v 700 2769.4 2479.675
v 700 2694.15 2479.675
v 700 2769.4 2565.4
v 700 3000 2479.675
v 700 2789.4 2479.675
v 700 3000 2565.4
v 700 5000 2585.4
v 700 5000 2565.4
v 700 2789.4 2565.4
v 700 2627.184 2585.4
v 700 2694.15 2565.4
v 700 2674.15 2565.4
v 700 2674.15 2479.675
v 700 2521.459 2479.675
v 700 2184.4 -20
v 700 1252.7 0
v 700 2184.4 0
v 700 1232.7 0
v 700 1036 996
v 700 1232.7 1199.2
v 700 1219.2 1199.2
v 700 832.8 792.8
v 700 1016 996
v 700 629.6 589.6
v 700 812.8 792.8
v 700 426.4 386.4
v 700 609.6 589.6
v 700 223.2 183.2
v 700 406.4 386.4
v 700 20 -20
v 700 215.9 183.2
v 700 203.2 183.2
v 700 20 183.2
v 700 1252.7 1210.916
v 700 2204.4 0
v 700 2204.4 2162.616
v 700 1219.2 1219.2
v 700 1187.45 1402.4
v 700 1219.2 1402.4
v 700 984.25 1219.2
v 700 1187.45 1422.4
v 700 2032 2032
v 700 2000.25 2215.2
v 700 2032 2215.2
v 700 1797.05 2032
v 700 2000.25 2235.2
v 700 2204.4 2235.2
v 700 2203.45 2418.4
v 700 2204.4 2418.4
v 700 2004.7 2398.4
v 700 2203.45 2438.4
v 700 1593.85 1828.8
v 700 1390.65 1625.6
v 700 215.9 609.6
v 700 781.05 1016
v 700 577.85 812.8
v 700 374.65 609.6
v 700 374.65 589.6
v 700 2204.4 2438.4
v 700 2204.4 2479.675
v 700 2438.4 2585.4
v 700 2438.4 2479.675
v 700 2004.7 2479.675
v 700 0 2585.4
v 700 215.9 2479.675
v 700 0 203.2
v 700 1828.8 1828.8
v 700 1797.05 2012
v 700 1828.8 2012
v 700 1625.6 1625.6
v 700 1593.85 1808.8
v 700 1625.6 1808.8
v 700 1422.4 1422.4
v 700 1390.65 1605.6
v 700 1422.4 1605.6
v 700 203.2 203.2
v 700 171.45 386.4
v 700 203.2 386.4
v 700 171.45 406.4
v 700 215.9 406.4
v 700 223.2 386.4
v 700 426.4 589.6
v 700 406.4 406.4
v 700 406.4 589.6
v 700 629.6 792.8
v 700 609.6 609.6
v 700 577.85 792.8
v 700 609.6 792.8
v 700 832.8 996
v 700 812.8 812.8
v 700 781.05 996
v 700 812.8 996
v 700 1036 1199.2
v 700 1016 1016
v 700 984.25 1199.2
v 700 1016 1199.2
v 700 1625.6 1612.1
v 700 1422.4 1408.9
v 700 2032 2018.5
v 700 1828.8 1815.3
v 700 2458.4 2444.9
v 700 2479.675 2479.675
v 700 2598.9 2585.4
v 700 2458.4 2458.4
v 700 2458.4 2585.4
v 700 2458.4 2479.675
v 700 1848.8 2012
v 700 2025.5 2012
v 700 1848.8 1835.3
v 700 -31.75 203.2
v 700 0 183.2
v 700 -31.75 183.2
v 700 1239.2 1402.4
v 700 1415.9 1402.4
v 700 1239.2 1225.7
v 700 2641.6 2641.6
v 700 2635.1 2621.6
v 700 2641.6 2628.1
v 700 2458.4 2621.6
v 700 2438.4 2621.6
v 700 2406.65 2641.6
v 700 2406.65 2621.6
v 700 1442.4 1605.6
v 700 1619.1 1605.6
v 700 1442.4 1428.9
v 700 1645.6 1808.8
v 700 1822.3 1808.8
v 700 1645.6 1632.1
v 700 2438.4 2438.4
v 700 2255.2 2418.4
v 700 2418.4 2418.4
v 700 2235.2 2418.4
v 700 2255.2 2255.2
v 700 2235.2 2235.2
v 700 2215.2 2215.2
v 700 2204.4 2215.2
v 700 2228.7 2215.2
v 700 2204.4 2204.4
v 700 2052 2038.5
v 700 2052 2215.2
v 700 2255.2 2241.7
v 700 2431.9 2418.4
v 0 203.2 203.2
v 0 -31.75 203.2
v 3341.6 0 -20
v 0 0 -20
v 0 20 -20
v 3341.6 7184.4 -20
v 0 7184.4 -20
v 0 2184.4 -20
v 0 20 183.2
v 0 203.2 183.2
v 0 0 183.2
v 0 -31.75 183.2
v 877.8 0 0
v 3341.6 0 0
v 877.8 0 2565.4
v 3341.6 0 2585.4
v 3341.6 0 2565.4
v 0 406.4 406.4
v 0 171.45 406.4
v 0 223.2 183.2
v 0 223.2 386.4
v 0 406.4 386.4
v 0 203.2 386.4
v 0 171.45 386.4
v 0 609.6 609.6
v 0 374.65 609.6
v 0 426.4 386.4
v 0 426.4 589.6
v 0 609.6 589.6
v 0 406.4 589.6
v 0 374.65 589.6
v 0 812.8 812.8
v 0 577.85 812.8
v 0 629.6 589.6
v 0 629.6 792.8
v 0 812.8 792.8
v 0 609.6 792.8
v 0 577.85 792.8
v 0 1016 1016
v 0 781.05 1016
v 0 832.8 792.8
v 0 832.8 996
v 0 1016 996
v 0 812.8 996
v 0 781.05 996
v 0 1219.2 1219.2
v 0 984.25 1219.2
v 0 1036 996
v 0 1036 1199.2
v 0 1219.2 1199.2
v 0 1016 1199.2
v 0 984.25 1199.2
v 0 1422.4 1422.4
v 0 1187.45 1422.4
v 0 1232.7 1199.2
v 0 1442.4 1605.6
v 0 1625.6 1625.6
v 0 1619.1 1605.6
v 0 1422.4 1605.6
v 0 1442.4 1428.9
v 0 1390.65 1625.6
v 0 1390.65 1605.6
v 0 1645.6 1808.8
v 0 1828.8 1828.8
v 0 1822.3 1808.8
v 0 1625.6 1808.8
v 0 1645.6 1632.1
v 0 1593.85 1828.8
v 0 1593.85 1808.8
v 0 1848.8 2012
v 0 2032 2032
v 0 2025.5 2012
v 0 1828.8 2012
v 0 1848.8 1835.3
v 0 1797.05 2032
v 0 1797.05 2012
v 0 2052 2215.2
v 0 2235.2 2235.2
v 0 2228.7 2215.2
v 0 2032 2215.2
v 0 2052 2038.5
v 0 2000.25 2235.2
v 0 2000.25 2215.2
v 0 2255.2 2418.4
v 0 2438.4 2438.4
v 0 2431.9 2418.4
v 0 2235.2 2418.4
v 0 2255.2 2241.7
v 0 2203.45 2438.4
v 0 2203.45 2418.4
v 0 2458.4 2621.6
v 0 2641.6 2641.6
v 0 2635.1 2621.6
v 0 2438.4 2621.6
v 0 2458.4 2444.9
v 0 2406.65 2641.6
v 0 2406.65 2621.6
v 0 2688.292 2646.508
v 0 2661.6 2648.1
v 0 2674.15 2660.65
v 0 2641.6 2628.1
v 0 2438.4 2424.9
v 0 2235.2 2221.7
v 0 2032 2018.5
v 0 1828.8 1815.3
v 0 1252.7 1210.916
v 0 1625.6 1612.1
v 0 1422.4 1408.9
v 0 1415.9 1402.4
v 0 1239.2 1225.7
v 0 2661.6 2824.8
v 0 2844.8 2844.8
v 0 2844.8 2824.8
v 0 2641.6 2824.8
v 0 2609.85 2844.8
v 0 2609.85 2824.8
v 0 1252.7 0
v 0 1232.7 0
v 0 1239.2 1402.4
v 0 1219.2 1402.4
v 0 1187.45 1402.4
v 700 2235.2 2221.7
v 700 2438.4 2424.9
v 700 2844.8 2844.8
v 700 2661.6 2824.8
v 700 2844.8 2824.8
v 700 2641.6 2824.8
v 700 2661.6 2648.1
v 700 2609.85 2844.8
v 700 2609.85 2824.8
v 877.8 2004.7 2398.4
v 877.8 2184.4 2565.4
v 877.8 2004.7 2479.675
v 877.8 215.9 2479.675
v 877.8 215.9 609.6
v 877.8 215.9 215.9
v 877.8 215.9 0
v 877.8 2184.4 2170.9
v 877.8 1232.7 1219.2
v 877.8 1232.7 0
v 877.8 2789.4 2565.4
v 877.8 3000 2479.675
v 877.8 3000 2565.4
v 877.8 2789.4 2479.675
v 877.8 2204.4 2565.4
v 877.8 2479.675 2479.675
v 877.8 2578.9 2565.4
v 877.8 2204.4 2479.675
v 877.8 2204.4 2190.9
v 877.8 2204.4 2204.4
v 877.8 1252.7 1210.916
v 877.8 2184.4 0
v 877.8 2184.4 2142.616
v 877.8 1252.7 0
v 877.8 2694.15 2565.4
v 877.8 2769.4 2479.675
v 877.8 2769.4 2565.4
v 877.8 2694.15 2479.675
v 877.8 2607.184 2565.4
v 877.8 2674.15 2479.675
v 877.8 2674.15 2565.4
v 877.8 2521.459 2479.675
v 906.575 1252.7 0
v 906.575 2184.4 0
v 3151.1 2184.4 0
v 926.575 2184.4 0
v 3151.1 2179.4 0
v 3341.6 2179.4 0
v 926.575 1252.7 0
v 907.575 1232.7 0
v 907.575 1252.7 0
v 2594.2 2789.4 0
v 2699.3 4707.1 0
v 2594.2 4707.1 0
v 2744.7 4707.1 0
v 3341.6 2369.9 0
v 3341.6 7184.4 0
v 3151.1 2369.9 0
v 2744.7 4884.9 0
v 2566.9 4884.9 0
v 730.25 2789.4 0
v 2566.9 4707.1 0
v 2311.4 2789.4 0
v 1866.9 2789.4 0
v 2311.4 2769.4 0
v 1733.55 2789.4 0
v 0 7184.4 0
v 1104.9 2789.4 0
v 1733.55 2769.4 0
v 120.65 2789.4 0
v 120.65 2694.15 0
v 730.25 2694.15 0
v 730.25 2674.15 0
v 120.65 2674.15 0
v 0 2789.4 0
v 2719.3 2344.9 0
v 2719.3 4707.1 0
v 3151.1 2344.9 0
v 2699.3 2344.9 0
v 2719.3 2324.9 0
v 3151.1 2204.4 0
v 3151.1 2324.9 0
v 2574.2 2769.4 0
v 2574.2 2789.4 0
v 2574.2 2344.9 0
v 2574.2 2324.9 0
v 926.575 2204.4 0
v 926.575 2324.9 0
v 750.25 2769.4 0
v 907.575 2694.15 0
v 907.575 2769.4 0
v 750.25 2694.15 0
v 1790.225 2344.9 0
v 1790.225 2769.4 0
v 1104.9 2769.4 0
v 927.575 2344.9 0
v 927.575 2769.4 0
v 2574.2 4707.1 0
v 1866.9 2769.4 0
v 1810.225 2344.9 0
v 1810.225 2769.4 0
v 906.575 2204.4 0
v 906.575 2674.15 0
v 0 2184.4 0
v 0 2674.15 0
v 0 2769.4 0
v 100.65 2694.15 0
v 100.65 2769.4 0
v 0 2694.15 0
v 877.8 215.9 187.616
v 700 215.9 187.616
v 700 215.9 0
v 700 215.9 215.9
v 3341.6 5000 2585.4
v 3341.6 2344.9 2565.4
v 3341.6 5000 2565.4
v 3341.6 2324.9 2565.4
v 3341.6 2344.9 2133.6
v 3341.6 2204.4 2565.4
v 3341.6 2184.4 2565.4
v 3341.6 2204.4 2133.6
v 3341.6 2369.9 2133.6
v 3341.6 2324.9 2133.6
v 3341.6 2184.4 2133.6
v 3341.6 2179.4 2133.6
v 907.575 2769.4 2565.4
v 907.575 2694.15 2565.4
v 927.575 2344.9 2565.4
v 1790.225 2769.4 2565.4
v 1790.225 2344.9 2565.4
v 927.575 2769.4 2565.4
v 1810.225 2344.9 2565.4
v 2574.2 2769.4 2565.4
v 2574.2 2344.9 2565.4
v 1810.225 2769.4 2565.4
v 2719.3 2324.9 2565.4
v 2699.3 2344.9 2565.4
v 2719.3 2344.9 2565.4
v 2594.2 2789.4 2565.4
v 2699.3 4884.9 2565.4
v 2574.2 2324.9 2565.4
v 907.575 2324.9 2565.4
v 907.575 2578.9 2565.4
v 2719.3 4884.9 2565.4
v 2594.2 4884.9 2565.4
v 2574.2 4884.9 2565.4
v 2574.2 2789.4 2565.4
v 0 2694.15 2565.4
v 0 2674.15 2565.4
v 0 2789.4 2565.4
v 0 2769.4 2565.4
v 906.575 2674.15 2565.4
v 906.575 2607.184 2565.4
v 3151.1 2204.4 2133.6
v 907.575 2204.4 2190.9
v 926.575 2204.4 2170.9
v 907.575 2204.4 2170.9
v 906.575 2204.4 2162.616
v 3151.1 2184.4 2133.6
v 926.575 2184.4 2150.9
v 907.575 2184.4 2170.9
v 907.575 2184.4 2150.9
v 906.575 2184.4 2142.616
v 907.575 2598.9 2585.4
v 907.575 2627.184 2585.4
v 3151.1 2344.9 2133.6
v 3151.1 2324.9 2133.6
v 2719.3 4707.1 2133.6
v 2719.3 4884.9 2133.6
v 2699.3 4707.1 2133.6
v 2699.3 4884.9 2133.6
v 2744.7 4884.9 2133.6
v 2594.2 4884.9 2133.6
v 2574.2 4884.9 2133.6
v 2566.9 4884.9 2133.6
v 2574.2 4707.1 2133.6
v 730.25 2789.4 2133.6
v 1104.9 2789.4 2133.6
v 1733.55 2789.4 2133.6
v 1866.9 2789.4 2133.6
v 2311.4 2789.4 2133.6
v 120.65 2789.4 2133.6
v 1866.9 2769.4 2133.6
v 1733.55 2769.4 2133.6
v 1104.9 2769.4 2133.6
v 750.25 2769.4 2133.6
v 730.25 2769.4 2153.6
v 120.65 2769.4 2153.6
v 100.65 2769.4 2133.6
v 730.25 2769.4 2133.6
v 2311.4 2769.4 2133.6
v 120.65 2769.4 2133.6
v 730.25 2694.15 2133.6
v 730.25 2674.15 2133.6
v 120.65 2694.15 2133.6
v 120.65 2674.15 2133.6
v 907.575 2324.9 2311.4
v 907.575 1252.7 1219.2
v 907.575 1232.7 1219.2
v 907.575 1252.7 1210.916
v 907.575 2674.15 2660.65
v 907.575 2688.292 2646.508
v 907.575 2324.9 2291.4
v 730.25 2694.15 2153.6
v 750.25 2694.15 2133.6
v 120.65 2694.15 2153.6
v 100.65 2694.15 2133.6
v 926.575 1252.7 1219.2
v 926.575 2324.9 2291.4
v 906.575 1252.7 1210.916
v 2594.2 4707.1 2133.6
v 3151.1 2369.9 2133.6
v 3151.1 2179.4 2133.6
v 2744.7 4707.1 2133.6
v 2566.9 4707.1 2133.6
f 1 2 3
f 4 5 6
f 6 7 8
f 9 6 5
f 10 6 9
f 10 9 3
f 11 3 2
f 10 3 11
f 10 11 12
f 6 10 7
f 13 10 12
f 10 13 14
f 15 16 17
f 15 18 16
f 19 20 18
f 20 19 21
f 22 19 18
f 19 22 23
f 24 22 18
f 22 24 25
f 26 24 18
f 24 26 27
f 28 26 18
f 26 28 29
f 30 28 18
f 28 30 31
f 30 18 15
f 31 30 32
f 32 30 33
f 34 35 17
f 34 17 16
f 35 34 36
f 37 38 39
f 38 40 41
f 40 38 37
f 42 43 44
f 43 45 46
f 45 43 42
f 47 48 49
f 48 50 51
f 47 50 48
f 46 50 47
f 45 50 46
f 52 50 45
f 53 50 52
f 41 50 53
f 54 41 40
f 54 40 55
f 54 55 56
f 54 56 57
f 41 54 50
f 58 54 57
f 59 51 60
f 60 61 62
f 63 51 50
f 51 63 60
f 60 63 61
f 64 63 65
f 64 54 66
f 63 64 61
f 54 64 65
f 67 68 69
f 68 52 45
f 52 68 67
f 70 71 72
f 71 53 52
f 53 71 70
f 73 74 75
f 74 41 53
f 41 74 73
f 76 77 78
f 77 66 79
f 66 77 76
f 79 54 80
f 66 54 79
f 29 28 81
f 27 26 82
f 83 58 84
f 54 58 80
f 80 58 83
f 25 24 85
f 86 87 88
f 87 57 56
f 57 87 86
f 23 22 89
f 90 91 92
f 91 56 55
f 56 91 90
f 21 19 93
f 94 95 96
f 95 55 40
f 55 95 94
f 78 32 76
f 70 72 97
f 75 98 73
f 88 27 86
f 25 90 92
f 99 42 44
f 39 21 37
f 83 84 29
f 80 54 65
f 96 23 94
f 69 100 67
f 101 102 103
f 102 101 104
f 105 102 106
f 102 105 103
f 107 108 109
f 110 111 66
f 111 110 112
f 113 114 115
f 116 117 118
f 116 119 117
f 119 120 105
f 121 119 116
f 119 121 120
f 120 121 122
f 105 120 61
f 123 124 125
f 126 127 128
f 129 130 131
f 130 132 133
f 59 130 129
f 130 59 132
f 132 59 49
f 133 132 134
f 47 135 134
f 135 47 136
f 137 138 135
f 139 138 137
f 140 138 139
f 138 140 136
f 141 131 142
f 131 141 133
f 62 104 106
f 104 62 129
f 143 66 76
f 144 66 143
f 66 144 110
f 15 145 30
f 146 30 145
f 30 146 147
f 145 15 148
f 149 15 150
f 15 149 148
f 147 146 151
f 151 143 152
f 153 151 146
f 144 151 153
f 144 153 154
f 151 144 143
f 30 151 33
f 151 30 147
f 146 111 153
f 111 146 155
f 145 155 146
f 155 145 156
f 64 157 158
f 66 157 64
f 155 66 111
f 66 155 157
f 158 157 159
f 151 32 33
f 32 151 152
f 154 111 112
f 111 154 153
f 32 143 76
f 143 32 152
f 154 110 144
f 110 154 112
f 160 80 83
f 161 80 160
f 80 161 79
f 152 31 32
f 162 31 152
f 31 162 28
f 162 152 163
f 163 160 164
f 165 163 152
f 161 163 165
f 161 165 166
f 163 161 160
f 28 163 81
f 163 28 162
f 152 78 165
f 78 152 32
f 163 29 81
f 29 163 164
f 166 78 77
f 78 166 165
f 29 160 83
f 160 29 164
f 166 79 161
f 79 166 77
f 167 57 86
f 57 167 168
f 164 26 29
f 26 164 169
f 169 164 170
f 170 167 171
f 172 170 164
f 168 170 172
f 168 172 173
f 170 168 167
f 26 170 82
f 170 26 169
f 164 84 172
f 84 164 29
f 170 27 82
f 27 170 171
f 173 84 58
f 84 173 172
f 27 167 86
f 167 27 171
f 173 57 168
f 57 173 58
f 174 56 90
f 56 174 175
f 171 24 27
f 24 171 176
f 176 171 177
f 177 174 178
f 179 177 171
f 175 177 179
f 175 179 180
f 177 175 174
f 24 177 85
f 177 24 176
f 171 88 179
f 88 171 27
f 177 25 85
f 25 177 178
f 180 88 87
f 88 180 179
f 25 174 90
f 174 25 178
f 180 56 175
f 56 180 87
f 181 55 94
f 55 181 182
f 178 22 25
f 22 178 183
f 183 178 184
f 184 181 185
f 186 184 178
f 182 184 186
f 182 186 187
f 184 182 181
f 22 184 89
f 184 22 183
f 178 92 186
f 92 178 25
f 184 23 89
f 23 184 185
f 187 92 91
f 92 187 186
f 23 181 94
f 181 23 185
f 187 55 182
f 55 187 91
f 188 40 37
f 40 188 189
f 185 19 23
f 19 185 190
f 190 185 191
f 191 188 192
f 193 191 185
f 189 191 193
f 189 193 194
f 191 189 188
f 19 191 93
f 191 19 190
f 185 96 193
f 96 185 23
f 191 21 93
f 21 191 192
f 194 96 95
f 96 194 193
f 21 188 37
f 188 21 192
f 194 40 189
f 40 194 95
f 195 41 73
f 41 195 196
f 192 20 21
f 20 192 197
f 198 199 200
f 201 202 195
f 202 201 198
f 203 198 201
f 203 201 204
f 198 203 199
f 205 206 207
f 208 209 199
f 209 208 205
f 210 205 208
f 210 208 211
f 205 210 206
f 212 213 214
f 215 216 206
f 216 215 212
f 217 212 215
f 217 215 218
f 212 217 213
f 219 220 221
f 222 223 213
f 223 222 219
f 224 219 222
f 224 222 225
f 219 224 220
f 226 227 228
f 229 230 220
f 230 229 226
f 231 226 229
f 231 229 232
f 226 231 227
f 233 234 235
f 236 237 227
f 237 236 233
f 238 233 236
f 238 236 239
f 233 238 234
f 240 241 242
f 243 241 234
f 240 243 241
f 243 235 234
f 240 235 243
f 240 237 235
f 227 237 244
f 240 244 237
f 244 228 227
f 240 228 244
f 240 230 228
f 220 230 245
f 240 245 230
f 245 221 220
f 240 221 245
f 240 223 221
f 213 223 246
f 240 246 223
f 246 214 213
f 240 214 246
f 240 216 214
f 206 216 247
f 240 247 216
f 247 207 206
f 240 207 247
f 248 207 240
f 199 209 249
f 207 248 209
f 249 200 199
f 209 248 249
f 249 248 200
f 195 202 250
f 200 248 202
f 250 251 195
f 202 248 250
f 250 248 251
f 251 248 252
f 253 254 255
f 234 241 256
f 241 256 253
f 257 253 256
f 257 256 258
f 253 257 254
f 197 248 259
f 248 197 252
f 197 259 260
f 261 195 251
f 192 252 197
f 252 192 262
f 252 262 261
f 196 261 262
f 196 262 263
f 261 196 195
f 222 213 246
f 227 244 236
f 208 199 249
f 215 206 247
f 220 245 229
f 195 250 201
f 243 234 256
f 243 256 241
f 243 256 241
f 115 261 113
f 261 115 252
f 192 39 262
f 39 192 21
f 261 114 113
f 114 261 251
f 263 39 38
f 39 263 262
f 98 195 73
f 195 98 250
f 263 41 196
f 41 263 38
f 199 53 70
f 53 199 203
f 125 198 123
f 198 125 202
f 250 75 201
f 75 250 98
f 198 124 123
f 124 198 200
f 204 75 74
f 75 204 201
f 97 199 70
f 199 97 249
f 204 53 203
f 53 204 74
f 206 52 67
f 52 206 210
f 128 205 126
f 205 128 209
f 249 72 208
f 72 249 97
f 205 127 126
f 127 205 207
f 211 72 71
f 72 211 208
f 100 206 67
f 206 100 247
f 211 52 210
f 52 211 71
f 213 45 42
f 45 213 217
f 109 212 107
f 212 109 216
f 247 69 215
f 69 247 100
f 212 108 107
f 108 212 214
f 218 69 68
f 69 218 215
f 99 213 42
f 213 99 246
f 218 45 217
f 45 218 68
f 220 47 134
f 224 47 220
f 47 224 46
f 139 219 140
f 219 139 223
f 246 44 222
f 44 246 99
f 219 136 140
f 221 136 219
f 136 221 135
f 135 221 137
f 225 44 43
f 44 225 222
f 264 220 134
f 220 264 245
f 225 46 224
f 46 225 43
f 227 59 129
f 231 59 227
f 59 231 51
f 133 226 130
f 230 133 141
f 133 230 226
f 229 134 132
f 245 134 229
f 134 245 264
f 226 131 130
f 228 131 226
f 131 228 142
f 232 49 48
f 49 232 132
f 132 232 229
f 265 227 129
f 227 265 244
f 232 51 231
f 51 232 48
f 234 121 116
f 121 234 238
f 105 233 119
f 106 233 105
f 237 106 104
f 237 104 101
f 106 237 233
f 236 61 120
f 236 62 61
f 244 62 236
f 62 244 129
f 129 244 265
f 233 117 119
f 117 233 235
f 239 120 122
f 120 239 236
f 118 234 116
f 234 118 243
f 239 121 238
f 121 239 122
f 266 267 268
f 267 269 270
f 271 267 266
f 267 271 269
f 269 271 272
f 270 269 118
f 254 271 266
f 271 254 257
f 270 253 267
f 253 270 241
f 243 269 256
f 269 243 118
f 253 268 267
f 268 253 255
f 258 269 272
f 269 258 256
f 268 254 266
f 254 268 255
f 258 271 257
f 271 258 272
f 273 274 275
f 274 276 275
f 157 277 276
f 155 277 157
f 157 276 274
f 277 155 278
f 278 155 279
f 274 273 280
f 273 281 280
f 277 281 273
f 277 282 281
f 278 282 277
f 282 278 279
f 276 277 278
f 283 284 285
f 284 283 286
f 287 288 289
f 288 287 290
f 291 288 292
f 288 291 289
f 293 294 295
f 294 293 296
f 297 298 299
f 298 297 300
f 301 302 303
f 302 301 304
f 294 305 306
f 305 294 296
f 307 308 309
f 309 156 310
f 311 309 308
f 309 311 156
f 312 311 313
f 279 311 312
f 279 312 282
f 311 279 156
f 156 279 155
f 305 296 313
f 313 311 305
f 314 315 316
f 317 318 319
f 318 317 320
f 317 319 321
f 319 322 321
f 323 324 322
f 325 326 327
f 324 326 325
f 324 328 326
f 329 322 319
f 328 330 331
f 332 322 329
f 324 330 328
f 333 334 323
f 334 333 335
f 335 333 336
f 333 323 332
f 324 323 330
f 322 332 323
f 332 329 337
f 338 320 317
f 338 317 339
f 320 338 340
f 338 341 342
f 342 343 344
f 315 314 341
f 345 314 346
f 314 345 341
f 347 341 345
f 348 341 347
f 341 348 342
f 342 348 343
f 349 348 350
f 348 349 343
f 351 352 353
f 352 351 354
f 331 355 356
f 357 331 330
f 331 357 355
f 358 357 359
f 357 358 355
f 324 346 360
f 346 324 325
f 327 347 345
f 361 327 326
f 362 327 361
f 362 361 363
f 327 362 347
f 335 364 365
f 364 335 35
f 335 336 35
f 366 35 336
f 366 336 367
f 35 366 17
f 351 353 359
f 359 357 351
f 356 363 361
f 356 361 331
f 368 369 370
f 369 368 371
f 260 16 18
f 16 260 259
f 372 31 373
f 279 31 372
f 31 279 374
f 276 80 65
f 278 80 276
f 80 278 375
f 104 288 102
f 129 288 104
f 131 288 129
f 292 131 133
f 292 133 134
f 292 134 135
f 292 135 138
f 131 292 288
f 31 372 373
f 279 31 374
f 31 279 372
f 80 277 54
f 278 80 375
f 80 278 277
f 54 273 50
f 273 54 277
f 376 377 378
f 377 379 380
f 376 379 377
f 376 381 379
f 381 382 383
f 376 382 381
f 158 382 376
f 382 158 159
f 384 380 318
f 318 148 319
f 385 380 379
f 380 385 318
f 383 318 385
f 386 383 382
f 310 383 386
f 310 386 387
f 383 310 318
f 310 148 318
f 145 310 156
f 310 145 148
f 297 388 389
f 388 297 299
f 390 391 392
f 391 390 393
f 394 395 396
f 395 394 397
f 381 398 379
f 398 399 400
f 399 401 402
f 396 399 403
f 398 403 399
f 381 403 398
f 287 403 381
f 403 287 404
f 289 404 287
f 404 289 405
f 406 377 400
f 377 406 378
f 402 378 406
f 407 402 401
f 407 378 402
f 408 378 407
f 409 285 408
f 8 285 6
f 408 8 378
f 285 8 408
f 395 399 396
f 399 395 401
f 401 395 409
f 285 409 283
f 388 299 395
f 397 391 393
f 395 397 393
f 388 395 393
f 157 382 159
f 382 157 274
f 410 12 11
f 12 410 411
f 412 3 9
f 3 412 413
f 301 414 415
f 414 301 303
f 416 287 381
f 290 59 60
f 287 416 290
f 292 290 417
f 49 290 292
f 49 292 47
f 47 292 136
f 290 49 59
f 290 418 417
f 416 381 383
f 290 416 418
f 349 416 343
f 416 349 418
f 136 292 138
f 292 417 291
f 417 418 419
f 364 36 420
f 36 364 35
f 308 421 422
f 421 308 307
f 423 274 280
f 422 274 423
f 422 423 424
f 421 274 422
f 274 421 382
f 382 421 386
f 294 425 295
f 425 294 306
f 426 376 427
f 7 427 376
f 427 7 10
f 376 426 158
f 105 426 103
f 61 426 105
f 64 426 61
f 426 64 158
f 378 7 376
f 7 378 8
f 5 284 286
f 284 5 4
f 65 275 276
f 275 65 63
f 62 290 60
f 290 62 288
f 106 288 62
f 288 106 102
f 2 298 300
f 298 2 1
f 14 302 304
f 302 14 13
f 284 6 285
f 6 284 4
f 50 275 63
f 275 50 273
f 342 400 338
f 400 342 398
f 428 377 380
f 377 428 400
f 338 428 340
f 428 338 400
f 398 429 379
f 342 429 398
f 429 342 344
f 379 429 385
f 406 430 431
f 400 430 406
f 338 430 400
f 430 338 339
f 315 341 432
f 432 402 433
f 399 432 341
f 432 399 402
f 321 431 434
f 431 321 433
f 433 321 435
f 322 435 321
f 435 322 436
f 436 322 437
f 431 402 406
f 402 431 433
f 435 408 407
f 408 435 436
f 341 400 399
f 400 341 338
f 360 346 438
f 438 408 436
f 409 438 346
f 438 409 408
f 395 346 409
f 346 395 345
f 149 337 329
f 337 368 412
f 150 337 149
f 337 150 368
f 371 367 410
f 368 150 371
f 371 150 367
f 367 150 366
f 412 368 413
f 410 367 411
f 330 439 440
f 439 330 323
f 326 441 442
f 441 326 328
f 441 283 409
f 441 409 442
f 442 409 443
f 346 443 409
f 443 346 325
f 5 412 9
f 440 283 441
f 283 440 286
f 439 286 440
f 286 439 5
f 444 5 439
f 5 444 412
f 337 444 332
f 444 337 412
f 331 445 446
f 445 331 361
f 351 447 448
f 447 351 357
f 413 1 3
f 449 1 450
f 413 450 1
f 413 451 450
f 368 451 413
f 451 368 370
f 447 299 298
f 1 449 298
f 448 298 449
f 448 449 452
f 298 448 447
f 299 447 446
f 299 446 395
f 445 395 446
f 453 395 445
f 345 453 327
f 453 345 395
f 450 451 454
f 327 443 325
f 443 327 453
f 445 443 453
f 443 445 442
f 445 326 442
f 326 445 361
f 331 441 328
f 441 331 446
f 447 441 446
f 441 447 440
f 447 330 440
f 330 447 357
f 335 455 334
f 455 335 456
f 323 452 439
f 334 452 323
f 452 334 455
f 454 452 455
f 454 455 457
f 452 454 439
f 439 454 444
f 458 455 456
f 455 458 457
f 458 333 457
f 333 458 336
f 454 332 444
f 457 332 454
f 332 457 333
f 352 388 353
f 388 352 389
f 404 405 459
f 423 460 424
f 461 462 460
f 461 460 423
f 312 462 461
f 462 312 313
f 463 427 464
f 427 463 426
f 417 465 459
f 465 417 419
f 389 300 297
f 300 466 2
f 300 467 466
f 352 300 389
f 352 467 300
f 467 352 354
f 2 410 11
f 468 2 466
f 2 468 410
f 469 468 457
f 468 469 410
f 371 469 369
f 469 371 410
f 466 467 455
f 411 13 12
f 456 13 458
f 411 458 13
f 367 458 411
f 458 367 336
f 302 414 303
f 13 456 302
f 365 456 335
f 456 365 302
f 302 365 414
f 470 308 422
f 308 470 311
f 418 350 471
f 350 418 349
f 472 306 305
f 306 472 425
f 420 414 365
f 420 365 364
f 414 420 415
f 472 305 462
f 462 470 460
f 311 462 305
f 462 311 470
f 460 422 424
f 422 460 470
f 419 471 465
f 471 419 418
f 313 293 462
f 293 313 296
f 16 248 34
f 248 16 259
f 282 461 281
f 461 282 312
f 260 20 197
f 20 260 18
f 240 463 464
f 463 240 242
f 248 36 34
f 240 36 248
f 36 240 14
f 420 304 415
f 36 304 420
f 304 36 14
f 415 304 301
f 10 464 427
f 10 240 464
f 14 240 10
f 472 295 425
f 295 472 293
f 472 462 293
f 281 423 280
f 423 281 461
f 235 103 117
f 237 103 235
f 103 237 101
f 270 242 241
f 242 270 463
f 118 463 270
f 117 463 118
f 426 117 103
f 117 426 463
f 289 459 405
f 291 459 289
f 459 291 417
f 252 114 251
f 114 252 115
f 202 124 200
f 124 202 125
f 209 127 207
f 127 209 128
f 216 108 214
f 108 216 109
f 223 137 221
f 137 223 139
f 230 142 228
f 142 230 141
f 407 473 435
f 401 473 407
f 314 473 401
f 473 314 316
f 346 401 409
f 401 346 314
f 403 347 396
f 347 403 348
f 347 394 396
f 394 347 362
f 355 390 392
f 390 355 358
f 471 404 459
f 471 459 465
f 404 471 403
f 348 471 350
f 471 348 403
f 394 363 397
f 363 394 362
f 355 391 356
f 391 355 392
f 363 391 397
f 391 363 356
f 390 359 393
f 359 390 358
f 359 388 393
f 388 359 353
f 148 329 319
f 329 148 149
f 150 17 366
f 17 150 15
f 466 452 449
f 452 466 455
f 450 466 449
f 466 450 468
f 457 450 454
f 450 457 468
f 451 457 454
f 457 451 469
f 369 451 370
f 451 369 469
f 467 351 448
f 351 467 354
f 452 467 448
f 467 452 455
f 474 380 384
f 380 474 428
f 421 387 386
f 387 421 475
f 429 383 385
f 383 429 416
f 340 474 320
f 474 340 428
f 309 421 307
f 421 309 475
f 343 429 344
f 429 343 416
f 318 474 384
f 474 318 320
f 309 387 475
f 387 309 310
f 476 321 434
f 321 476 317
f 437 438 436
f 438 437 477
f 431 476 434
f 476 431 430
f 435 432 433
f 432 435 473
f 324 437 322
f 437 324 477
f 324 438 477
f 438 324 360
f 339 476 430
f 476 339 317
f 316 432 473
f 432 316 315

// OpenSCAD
step_height_inches = 8;
step_overlap_inches = 1.25;
first_floor_height_inches = 101;
stairs_bannister_place_inches = 7;
stairs_bannister_place_height_at_start_inches = 24;
stairs_post_ns_inches = 8.5;
stairs_post_ew_inches = 7;
front_room_east_wall_length_to_post_inches = 77.5;
front_room_south_wall_to_edge_of_door_opening_inches = 104;

step_height_mm = step_height_inches * 25.4;
step_width_mm = 700;
step_depth_mm = 20;
stairs_post_ns_mm = stairs_post_ns_inches * 25.4;
stairs_post_ew_mm = stairs_post_ew_inches * 25.4;
stairs_bannister_place_height_at_start_mm = stairs_bannister_place_height_at_start_inches * 25.4;

step_overlap_mm = step_overlap_inches * 25.4;

wall_thickness_mm = 20;

first_floor_height_mm = first_floor_height_inches * 25.4;
front_room_east_wall_length_to_post_mm = front_room_east_wall_length_to_post_inches * 25.4;
front_room_south_wall_to_edge_of_door_opening_mm = front_room_south_wall_to_edge_of_door_opening_inches * 25.4;
front_room_door_lintel_thickness_mm = 5;

module step()
{
  translate([0, 0, -step_depth_mm])
  cube([step_width_mm, step_depth_mm, step_height_mm + step_depth_mm]);
  translate([0, -step_overlap_mm, step_height_mm - step_depth_mm])
  cube([step_width_mm, step_height_mm + step_overlap_mm, step_depth_mm]);
}

module steps()
{
  for (i = [1 : 14])
  {
    translate([0, step_height_mm * (i - 1), step_height_mm * (i - 1)])
    step();
  }

  translate([step_width_mm, 0, 0])
  cube([stairs_post_ew_mm, stairs_post_ns_mm, first_floor_height_mm]);

  translate([step_width_mm, 0, 0])
  rotate([-45, 0, 0])
  cube([stairs_post_ew_mm, wall_thickness_mm, first_floor_height_mm * sqrt(2)]);
}

front_room_ceiling_edge_height_inches = 3.375;
front_room_ceiling_corner_block_inches = 5.5;

front_room_ceiling_edge_height_mm = front_room_ceiling_edge_height_inches * 25.4;
front_room_ceiling_corner_block_mm = front_room_ceiling_corner_block_inches * 25.4;

module front_room()
{
  translate([step_width_mm, stairs_post_ns_mm, 0])
  difference()
  {
    cube([stairs_post_ew_mm, front_room_east_wall_length_to_post_mm, first_floor_height_mm]);
    
    translate([-wall_thickness_mm, 0, stairs_bannister_place_height_at_start_mm])
    rotate([45, 0, 0])
    cube([stairs_post_ew_mm + wall_thickness_mm * 2, front_room_east_wall_length_to_post_mm * 2, first_floor_height_mm]);
  }

  translate([step_width_mm, stairs_post_ns_mm + front_room_east_wall_length_to_post_mm, 0])
  cube([front_room_south_wall_to_edge_of_door_opening_mm, wall_thickness_mm, first_floor_height_mm]);
  
  translate([step_width_mm, 0, first_floor_height_mm])
  cube([front_room_south_wall_to_edge_of_door_opening_mm, 5000, wall_thickness_mm]);
  
  translate([step_width_mm, 0, -wall_thickness_mm])
  cube([front_room_south_wall_to_edge_of_door_opening_mm, 5000, wall_thickness_mm]);
  
  translate([step_width_mm, 0, first_floor_height_mm - front_room_ceiling_edge_height_mm])
  cube([stairs_post_ew_mm, 3000, front_room_ceiling_edge_height_mm]);
  
  translate([step_width_mm, stairs_post_ns_mm + front_room_east_wall_length_to_post_mm - front_room_ceiling_corner_block_mm - 40, first_floor_height_mm - front_room_ceiling_corner_block_mm * 2])
  cube([stairs_post_ew_mm, front_room_ceiling_corner_block_mm, front_room_ceiling_corner_block_mm * 2]);
}

front_room_door_frame_thickness_inches = 7.5;
door_frame_height_inches = 84; // estimate

front_room_door_frame_thickness_mm = front_room_door_frame_thickness_inches * 25.4;
door_frame_height_mm = door_frame_height_inches * 25.4;
door_frame_protrusion_into_front_room_mm = 5;
front_room_door_frame_protrusion_into_middle_room_mm = 25;

front_room_to_middle_room_wall_thickness_mm = front_room_door_frame_thickness_mm - door_frame_protrusion_into_front_room_mm - front_room_door_frame_protrusion_into_middle_room_mm;

middle_room_north_wall_inches = 24.5;
middle_room_east_wall_inches = 100;

middle_room_north_wall_mm = middle_room_north_wall_inches * 25.4;
middle_room_east_wall_mm = middle_room_east_wall_inches * 25.4;

module door_from_front_room_to_middle_room()
{
  translate(
    [
      step_width_mm + front_room_south_wall_to_edge_of_door_opening_mm - front_room_door_frame_thickness_mm,
      stairs_post_ns_mm + front_room_east_wall_length_to_post_mm - door_frame_protrusion_into_front_room_mm,
      0
    ])
  cube([front_room_door_frame_thickness_mm, front_room_door_frame_thickness_mm, door_frame_height_mm]);
}

module middle_room()
{
  translate(
    [
      step_width_mm + front_room_south_wall_to_edge_of_door_opening_mm - middle_room_north_wall_mm,
      stairs_post_ns_mm + front_room_east_wall_length_to_post_mm + front_room_door_frame_thickness_mm - door_frame_protrusion_into_front_room_mm - front_room_door_frame_protrusion_into_middle_room_mm - wall_thickness_mm,
      0
    ])
  cube([middle_room_north_wall_mm, wall_thickness_mm, first_floor_height_mm]);
  
  translate(
    [
      step_width_mm + front_room_south_wall_to_edge_of_door_opening_mm - middle_room_north_wall_mm - wall_thickness_mm,
      stairs_post_ns_mm + front_room_east_wall_length_to_post_mm + front_room_door_frame_thickness_mm - door_frame_protrusion_into_front_room_mm - front_room_door_frame_protrusion_into_middle_room_mm,
      0
    ])
  cube([wall_thickness_mm, middle_room_east_wall_mm, first_floor_height_mm]);
}

bedroom_door_frame_thickness_inches = 7;
bedroom_door_frame_protrusion_into_middle_room_inches = 1;
bedroom_door_frame_protrusion_into_bedroom_inches = 0.5;

bedroom_door_frame_thickness_mm = bedroom_door_frame_thickness_inches * 25.4;
bedroom_door_frame_protrusion_into_middle_room_mm = bedroom_door_frame_protrusion_into_middle_room_inches * 25.4;
bedroom_door_frame_protrusion_into_bedroom_mm = bedroom_door_frame_protrusion_into_bedroom_inches * 25.4;

module door_from_middle_room_to_bedroom()
{
  translate(
    [
      step_width_mm + front_room_south_wall_to_edge_of_door_opening_mm - middle_room_north_wall_mm - bedroom_door_frame_thickness_mm + bedroom_door_frame_protrusion_into_middle_room_mm,
      stairs_post_ns_mm + front_room_east_wall_length_to_post_mm + front_room_door_frame_thickness_mm - door_frame_protrusion_into_front_room_mm - front_room_door_frame_protrusion_into_middle_room_mm + middle_room_east_wall_mm - bedroom_door_frame_thickness_mm,
      0
    ])
  cube([bedroom_door_frame_thickness_mm, bedroom_door_frame_thickness_mm, door_frame_height_mm]);
}

bedroom_west_wall_inches = 82.5;
bedroom_closet_opening_offset_inches = 73.5;
bedroom_closet_opening_width_inches = 17.5;
bedroom_sink_opening_offset_inches = 43.5;
bedroom_sink_opening_width_inches = 24.75;
bedroom_toilet_opening_offset_inches = 4.75;
bedroom_toilet_opening_width_inches = 24;
bedroom_toilet_stall_back_wall_depth_inches = 56.75;
bedroom_toilet_stall_back_wall_height_inches = 48;
bedroom_toilet_stall_south_wall_depth_inches = 3.75;

bedroom_west_wall_mm = bedroom_west_wall_inches * 25.4;

bedroom_north_wall_mm = step_width_mm + front_room_south_wall_to_edge_of_door_opening_mm - middle_room_north_wall_mm - bedroom_door_frame_thickness_mm + wall_thickness_mm + bedroom_door_frame_protrusion_into_bedroom_mm;
bedroom_north_edge_offset_mm = stairs_post_ns_mm + front_room_east_wall_length_to_post_mm + front_room_door_frame_thickness_mm - door_frame_protrusion_into_front_room_mm - front_room_door_frame_protrusion_into_middle_room_mm + middle_room_east_wall_mm - bedroom_west_wall_mm;

bedroom_closet_opening_offset_mm = bedroom_closet_opening_offset_inches * 25.4;
bedroom_closet_opening_width_mm = bedroom_closet_opening_width_inches * 25.4;

bedroom_sink_opening_offset_mm = bedroom_sink_opening_offset_inches * 25.4;
bedroom_sink_opening_width_mm = bedroom_sink_opening_width_inches * 25.4;

bedroom_toilet_opening_offset_mm = bedroom_toilet_opening_offset_inches * 25.4;
bedroom_toilet_opening_width_mm = bedroom_toilet_opening_width_inches * 25.4;

bedroom_toilet_stall_back_wall_depth_mm = bedroom_toilet_stall_back_wall_depth_inches * 25.4;
bedroom_toilet_stall_back_wall_height_mm = bedroom_toilet_stall_back_wall_height_inches * 25.4;

bedroom_toilet_stall_width_mm = bedroom_sink_opening_offset_mm - 0.5 * (bedroom_sink_opening_offset_mm - (bedroom_toilet_opening_offset_mm + bedroom_toilet_opening_width_mm)) - 0.5 * wall_thickness_mm;

bedroom_toilet_stall_south_wall_depth_mm = bedroom_toilet_stall_south_wall_depth_inches * 25.4;

module bedroom_toilet_stall()
{
  translate([0, stairs_post_ns_mm + front_room_east_wall_length_to_post_mm + front_room_door_frame_thickness_mm - door_frame_protrusion_into_front_room_mm - front_room_door_frame_protrusion_into_middle_room_mm + middle_room_east_wall_mm - bedroom_west_wall_mm - bedroom_toilet_stall_back_wall_depth_mm - bedroom_toilet_stall_south_wall_depth_mm - wall_thickness_mm, 0])
  cube([bedroom_toilet_stall_width_mm, wall_thickness_mm, bedroom_toilet_stall_back_wall_height_mm]);

  translate([0, stairs_post_ns_mm + front_room_east_wall_length_to_post_mm + front_room_door_frame_thickness_mm - door_frame_protrusion_into_front_room_mm - front_room_door_frame_protrusion_into_middle_room_mm + middle_room_east_wall_mm - bedroom_west_wall_mm - bedroom_toilet_stall_back_wall_depth_mm - bedroom_toilet_stall_south_wall_depth_mm - wall_thickness_mm, bedroom_toilet_stall_back_wall_height_mm])
  rotate([-45, 0, 0])
  cube([bedroom_toilet_stall_width_mm, wall_thickness_mm, bedroom_toilet_stall_back_wall_depth_mm * sqrt(2)]);
  
  translate([bedroom_toilet_stall_width_mm - 1, stairs_post_ns_mm + front_room_east_wall_length_to_post_mm + front_room_door_frame_thickness_mm - door_frame_protrusion_into_front_room_mm - front_room_door_frame_protrusion_into_middle_room_mm + middle_room_east_wall_mm - bedroom_west_wall_mm - bedroom_toilet_stall_south_wall_depth_mm - bedroom_toilet_stall_back_wall_depth_mm, 0])
  difference()
  {
    cube([wall_thickness_mm, bedroom_toilet_stall_back_wall_depth_mm, first_floor_height_mm]);
    
    translate([-wall_thickness_mm, 0, bedroom_toilet_stall_back_wall_height_mm])
    rotate([-45, 0, 0])
    translate([0, -bedroom_toilet_stall_back_wall_depth_mm, 0])
    cube([wall_thickness_mm * 4, bedroom_toilet_stall_back_wall_depth_mm, first_floor_height_mm]);
  }
}

module bedroom()
{
  translate(
    [
      bedroom_north_wall_mm,
      stairs_post_ns_mm + front_room_east_wall_length_to_post_mm + front_room_door_frame_thickness_mm - door_frame_protrusion_into_front_room_mm - front_room_door_frame_protrusion_into_middle_room_mm + middle_room_east_wall_mm - bedroom_west_wall_mm,
      0
    ])
  cube([wall_thickness_mm, bedroom_west_wall_mm, first_floor_height_mm]);
  
  translate([0, bedroom_north_edge_offset_mm - wall_thickness_mm, 0])
  {
    difference()
    {
      cube([bedroom_north_wall_mm, wall_thickness_mm, first_floor_height_mm]);
  
      translate([bedroom_closet_opening_offset_mm, -wall_thickness_mm, -5])
      cube([bedroom_closet_opening_width_mm, 10 * wall_thickness_mm, door_frame_height_mm + 5]);
      translate([bedroom_sink_opening_offset_mm, -wall_thickness_mm, -5])
      cube([bedroom_sink_opening_width_mm, 10 * wall_thickness_mm, door_frame_height_mm + 5]);
      translate([bedroom_toilet_opening_offset_mm, -wall_thickness_mm, -5])
      cube([bedroom_toilet_opening_width_mm, 10 * wall_thickness_mm, door_frame_height_mm + 5]);
    }
  }

  bedroom_closet_divider_depth_mm = middle_room_east_wall_mm - bedroom_west_wall_mm;

  translate([bedroom_toilet_stall_width_mm, bedroom_north_edge_offset_mm - wall_thickness_mm - bedroom_closet_divider_depth_mm, 0])
  cube([bedroom_north_wall_mm - bedroom_toilet_stall_width_mm, wall_thickness_mm, first_floor_height_mm]);

  translate(
    [
      bedroom_closet_opening_offset_mm - 0.5 * (bedroom_closet_opening_offset_mm - (bedroom_sink_opening_offset_mm + bedroom_sink_opening_width_mm)) - 0.5 * wall_thickness_mm,
      bedroom_north_edge_offset_mm - wall_thickness_mm - bedroom_closet_divider_depth_mm,
      0
    ])
  cube([wall_thickness_mm, bedroom_closet_divider_depth_mm, first_floor_height_mm]);

  translate(
    [
      bedroom_toilet_stall_width_mm,
      bedroom_north_edge_offset_mm - wall_thickness_mm - bedroom_closet_divider_depth_mm,
      0
    ])
  cube([wall_thickness_mm, bedroom_closet_divider_depth_mm, first_floor_height_mm]);

  translate([0, stairs_post_ns_mm + front_room_east_wall_length_to_post_mm, -wall_thickness_mm])
  cube([step_width_mm + front_room_south_wall_to_edge_of_door_opening_mm, 5000, wall_thickness_mm]);
  
  translate([0, bedroom_north_edge_offset_mm - bedroom_toilet_stall_south_wall_depth_mm - wall_thickness_mm, 0])
  difference()
  {
    cube([bedroom_toilet_stall_width_mm, wall_thickness_mm, first_floor_height_mm]);

    translate([bedroom_toilet_opening_offset_mm, -wall_thickness_mm, -5])
    cube([bedroom_toilet_opening_width_mm, 10 * wall_thickness_mm, door_frame_height_mm + 5]);
  }
  
  translate([bedroom_toilet_opening_offset_mm, bedroom_north_edge_offset_mm - bedroom_toilet_stall_south_wall_depth_mm, door_frame_height_mm])
  cube([bedroom_toilet_opening_width_mm, bedroom_toilet_stall_south_wall_depth_mm, wall_thickness_mm]);
  translate([bedroom_toilet_opening_offset_mm - wall_thickness_mm, bedroom_north_edge_offset_mm - bedroom_toilet_stall_south_wall_depth_mm, 0])
  cube([wall_thickness_mm, bedroom_toilet_stall_south_wall_depth_mm, door_frame_height_mm]);
  translate([bedroom_toilet_opening_offset_mm + bedroom_toilet_opening_width_mm, bedroom_north_edge_offset_mm - bedroom_toilet_stall_south_wall_depth_mm, 0])
  cube([wall_thickness_mm, bedroom_toilet_stall_south_wall_depth_mm, door_frame_height_mm]);
  
  bedroom_toilet_stall();
}

steps();

front_room();

door_from_front_room_to_middle_room();

middle_room();

door_from_middle_room_to_bedroom();

bedroom();
